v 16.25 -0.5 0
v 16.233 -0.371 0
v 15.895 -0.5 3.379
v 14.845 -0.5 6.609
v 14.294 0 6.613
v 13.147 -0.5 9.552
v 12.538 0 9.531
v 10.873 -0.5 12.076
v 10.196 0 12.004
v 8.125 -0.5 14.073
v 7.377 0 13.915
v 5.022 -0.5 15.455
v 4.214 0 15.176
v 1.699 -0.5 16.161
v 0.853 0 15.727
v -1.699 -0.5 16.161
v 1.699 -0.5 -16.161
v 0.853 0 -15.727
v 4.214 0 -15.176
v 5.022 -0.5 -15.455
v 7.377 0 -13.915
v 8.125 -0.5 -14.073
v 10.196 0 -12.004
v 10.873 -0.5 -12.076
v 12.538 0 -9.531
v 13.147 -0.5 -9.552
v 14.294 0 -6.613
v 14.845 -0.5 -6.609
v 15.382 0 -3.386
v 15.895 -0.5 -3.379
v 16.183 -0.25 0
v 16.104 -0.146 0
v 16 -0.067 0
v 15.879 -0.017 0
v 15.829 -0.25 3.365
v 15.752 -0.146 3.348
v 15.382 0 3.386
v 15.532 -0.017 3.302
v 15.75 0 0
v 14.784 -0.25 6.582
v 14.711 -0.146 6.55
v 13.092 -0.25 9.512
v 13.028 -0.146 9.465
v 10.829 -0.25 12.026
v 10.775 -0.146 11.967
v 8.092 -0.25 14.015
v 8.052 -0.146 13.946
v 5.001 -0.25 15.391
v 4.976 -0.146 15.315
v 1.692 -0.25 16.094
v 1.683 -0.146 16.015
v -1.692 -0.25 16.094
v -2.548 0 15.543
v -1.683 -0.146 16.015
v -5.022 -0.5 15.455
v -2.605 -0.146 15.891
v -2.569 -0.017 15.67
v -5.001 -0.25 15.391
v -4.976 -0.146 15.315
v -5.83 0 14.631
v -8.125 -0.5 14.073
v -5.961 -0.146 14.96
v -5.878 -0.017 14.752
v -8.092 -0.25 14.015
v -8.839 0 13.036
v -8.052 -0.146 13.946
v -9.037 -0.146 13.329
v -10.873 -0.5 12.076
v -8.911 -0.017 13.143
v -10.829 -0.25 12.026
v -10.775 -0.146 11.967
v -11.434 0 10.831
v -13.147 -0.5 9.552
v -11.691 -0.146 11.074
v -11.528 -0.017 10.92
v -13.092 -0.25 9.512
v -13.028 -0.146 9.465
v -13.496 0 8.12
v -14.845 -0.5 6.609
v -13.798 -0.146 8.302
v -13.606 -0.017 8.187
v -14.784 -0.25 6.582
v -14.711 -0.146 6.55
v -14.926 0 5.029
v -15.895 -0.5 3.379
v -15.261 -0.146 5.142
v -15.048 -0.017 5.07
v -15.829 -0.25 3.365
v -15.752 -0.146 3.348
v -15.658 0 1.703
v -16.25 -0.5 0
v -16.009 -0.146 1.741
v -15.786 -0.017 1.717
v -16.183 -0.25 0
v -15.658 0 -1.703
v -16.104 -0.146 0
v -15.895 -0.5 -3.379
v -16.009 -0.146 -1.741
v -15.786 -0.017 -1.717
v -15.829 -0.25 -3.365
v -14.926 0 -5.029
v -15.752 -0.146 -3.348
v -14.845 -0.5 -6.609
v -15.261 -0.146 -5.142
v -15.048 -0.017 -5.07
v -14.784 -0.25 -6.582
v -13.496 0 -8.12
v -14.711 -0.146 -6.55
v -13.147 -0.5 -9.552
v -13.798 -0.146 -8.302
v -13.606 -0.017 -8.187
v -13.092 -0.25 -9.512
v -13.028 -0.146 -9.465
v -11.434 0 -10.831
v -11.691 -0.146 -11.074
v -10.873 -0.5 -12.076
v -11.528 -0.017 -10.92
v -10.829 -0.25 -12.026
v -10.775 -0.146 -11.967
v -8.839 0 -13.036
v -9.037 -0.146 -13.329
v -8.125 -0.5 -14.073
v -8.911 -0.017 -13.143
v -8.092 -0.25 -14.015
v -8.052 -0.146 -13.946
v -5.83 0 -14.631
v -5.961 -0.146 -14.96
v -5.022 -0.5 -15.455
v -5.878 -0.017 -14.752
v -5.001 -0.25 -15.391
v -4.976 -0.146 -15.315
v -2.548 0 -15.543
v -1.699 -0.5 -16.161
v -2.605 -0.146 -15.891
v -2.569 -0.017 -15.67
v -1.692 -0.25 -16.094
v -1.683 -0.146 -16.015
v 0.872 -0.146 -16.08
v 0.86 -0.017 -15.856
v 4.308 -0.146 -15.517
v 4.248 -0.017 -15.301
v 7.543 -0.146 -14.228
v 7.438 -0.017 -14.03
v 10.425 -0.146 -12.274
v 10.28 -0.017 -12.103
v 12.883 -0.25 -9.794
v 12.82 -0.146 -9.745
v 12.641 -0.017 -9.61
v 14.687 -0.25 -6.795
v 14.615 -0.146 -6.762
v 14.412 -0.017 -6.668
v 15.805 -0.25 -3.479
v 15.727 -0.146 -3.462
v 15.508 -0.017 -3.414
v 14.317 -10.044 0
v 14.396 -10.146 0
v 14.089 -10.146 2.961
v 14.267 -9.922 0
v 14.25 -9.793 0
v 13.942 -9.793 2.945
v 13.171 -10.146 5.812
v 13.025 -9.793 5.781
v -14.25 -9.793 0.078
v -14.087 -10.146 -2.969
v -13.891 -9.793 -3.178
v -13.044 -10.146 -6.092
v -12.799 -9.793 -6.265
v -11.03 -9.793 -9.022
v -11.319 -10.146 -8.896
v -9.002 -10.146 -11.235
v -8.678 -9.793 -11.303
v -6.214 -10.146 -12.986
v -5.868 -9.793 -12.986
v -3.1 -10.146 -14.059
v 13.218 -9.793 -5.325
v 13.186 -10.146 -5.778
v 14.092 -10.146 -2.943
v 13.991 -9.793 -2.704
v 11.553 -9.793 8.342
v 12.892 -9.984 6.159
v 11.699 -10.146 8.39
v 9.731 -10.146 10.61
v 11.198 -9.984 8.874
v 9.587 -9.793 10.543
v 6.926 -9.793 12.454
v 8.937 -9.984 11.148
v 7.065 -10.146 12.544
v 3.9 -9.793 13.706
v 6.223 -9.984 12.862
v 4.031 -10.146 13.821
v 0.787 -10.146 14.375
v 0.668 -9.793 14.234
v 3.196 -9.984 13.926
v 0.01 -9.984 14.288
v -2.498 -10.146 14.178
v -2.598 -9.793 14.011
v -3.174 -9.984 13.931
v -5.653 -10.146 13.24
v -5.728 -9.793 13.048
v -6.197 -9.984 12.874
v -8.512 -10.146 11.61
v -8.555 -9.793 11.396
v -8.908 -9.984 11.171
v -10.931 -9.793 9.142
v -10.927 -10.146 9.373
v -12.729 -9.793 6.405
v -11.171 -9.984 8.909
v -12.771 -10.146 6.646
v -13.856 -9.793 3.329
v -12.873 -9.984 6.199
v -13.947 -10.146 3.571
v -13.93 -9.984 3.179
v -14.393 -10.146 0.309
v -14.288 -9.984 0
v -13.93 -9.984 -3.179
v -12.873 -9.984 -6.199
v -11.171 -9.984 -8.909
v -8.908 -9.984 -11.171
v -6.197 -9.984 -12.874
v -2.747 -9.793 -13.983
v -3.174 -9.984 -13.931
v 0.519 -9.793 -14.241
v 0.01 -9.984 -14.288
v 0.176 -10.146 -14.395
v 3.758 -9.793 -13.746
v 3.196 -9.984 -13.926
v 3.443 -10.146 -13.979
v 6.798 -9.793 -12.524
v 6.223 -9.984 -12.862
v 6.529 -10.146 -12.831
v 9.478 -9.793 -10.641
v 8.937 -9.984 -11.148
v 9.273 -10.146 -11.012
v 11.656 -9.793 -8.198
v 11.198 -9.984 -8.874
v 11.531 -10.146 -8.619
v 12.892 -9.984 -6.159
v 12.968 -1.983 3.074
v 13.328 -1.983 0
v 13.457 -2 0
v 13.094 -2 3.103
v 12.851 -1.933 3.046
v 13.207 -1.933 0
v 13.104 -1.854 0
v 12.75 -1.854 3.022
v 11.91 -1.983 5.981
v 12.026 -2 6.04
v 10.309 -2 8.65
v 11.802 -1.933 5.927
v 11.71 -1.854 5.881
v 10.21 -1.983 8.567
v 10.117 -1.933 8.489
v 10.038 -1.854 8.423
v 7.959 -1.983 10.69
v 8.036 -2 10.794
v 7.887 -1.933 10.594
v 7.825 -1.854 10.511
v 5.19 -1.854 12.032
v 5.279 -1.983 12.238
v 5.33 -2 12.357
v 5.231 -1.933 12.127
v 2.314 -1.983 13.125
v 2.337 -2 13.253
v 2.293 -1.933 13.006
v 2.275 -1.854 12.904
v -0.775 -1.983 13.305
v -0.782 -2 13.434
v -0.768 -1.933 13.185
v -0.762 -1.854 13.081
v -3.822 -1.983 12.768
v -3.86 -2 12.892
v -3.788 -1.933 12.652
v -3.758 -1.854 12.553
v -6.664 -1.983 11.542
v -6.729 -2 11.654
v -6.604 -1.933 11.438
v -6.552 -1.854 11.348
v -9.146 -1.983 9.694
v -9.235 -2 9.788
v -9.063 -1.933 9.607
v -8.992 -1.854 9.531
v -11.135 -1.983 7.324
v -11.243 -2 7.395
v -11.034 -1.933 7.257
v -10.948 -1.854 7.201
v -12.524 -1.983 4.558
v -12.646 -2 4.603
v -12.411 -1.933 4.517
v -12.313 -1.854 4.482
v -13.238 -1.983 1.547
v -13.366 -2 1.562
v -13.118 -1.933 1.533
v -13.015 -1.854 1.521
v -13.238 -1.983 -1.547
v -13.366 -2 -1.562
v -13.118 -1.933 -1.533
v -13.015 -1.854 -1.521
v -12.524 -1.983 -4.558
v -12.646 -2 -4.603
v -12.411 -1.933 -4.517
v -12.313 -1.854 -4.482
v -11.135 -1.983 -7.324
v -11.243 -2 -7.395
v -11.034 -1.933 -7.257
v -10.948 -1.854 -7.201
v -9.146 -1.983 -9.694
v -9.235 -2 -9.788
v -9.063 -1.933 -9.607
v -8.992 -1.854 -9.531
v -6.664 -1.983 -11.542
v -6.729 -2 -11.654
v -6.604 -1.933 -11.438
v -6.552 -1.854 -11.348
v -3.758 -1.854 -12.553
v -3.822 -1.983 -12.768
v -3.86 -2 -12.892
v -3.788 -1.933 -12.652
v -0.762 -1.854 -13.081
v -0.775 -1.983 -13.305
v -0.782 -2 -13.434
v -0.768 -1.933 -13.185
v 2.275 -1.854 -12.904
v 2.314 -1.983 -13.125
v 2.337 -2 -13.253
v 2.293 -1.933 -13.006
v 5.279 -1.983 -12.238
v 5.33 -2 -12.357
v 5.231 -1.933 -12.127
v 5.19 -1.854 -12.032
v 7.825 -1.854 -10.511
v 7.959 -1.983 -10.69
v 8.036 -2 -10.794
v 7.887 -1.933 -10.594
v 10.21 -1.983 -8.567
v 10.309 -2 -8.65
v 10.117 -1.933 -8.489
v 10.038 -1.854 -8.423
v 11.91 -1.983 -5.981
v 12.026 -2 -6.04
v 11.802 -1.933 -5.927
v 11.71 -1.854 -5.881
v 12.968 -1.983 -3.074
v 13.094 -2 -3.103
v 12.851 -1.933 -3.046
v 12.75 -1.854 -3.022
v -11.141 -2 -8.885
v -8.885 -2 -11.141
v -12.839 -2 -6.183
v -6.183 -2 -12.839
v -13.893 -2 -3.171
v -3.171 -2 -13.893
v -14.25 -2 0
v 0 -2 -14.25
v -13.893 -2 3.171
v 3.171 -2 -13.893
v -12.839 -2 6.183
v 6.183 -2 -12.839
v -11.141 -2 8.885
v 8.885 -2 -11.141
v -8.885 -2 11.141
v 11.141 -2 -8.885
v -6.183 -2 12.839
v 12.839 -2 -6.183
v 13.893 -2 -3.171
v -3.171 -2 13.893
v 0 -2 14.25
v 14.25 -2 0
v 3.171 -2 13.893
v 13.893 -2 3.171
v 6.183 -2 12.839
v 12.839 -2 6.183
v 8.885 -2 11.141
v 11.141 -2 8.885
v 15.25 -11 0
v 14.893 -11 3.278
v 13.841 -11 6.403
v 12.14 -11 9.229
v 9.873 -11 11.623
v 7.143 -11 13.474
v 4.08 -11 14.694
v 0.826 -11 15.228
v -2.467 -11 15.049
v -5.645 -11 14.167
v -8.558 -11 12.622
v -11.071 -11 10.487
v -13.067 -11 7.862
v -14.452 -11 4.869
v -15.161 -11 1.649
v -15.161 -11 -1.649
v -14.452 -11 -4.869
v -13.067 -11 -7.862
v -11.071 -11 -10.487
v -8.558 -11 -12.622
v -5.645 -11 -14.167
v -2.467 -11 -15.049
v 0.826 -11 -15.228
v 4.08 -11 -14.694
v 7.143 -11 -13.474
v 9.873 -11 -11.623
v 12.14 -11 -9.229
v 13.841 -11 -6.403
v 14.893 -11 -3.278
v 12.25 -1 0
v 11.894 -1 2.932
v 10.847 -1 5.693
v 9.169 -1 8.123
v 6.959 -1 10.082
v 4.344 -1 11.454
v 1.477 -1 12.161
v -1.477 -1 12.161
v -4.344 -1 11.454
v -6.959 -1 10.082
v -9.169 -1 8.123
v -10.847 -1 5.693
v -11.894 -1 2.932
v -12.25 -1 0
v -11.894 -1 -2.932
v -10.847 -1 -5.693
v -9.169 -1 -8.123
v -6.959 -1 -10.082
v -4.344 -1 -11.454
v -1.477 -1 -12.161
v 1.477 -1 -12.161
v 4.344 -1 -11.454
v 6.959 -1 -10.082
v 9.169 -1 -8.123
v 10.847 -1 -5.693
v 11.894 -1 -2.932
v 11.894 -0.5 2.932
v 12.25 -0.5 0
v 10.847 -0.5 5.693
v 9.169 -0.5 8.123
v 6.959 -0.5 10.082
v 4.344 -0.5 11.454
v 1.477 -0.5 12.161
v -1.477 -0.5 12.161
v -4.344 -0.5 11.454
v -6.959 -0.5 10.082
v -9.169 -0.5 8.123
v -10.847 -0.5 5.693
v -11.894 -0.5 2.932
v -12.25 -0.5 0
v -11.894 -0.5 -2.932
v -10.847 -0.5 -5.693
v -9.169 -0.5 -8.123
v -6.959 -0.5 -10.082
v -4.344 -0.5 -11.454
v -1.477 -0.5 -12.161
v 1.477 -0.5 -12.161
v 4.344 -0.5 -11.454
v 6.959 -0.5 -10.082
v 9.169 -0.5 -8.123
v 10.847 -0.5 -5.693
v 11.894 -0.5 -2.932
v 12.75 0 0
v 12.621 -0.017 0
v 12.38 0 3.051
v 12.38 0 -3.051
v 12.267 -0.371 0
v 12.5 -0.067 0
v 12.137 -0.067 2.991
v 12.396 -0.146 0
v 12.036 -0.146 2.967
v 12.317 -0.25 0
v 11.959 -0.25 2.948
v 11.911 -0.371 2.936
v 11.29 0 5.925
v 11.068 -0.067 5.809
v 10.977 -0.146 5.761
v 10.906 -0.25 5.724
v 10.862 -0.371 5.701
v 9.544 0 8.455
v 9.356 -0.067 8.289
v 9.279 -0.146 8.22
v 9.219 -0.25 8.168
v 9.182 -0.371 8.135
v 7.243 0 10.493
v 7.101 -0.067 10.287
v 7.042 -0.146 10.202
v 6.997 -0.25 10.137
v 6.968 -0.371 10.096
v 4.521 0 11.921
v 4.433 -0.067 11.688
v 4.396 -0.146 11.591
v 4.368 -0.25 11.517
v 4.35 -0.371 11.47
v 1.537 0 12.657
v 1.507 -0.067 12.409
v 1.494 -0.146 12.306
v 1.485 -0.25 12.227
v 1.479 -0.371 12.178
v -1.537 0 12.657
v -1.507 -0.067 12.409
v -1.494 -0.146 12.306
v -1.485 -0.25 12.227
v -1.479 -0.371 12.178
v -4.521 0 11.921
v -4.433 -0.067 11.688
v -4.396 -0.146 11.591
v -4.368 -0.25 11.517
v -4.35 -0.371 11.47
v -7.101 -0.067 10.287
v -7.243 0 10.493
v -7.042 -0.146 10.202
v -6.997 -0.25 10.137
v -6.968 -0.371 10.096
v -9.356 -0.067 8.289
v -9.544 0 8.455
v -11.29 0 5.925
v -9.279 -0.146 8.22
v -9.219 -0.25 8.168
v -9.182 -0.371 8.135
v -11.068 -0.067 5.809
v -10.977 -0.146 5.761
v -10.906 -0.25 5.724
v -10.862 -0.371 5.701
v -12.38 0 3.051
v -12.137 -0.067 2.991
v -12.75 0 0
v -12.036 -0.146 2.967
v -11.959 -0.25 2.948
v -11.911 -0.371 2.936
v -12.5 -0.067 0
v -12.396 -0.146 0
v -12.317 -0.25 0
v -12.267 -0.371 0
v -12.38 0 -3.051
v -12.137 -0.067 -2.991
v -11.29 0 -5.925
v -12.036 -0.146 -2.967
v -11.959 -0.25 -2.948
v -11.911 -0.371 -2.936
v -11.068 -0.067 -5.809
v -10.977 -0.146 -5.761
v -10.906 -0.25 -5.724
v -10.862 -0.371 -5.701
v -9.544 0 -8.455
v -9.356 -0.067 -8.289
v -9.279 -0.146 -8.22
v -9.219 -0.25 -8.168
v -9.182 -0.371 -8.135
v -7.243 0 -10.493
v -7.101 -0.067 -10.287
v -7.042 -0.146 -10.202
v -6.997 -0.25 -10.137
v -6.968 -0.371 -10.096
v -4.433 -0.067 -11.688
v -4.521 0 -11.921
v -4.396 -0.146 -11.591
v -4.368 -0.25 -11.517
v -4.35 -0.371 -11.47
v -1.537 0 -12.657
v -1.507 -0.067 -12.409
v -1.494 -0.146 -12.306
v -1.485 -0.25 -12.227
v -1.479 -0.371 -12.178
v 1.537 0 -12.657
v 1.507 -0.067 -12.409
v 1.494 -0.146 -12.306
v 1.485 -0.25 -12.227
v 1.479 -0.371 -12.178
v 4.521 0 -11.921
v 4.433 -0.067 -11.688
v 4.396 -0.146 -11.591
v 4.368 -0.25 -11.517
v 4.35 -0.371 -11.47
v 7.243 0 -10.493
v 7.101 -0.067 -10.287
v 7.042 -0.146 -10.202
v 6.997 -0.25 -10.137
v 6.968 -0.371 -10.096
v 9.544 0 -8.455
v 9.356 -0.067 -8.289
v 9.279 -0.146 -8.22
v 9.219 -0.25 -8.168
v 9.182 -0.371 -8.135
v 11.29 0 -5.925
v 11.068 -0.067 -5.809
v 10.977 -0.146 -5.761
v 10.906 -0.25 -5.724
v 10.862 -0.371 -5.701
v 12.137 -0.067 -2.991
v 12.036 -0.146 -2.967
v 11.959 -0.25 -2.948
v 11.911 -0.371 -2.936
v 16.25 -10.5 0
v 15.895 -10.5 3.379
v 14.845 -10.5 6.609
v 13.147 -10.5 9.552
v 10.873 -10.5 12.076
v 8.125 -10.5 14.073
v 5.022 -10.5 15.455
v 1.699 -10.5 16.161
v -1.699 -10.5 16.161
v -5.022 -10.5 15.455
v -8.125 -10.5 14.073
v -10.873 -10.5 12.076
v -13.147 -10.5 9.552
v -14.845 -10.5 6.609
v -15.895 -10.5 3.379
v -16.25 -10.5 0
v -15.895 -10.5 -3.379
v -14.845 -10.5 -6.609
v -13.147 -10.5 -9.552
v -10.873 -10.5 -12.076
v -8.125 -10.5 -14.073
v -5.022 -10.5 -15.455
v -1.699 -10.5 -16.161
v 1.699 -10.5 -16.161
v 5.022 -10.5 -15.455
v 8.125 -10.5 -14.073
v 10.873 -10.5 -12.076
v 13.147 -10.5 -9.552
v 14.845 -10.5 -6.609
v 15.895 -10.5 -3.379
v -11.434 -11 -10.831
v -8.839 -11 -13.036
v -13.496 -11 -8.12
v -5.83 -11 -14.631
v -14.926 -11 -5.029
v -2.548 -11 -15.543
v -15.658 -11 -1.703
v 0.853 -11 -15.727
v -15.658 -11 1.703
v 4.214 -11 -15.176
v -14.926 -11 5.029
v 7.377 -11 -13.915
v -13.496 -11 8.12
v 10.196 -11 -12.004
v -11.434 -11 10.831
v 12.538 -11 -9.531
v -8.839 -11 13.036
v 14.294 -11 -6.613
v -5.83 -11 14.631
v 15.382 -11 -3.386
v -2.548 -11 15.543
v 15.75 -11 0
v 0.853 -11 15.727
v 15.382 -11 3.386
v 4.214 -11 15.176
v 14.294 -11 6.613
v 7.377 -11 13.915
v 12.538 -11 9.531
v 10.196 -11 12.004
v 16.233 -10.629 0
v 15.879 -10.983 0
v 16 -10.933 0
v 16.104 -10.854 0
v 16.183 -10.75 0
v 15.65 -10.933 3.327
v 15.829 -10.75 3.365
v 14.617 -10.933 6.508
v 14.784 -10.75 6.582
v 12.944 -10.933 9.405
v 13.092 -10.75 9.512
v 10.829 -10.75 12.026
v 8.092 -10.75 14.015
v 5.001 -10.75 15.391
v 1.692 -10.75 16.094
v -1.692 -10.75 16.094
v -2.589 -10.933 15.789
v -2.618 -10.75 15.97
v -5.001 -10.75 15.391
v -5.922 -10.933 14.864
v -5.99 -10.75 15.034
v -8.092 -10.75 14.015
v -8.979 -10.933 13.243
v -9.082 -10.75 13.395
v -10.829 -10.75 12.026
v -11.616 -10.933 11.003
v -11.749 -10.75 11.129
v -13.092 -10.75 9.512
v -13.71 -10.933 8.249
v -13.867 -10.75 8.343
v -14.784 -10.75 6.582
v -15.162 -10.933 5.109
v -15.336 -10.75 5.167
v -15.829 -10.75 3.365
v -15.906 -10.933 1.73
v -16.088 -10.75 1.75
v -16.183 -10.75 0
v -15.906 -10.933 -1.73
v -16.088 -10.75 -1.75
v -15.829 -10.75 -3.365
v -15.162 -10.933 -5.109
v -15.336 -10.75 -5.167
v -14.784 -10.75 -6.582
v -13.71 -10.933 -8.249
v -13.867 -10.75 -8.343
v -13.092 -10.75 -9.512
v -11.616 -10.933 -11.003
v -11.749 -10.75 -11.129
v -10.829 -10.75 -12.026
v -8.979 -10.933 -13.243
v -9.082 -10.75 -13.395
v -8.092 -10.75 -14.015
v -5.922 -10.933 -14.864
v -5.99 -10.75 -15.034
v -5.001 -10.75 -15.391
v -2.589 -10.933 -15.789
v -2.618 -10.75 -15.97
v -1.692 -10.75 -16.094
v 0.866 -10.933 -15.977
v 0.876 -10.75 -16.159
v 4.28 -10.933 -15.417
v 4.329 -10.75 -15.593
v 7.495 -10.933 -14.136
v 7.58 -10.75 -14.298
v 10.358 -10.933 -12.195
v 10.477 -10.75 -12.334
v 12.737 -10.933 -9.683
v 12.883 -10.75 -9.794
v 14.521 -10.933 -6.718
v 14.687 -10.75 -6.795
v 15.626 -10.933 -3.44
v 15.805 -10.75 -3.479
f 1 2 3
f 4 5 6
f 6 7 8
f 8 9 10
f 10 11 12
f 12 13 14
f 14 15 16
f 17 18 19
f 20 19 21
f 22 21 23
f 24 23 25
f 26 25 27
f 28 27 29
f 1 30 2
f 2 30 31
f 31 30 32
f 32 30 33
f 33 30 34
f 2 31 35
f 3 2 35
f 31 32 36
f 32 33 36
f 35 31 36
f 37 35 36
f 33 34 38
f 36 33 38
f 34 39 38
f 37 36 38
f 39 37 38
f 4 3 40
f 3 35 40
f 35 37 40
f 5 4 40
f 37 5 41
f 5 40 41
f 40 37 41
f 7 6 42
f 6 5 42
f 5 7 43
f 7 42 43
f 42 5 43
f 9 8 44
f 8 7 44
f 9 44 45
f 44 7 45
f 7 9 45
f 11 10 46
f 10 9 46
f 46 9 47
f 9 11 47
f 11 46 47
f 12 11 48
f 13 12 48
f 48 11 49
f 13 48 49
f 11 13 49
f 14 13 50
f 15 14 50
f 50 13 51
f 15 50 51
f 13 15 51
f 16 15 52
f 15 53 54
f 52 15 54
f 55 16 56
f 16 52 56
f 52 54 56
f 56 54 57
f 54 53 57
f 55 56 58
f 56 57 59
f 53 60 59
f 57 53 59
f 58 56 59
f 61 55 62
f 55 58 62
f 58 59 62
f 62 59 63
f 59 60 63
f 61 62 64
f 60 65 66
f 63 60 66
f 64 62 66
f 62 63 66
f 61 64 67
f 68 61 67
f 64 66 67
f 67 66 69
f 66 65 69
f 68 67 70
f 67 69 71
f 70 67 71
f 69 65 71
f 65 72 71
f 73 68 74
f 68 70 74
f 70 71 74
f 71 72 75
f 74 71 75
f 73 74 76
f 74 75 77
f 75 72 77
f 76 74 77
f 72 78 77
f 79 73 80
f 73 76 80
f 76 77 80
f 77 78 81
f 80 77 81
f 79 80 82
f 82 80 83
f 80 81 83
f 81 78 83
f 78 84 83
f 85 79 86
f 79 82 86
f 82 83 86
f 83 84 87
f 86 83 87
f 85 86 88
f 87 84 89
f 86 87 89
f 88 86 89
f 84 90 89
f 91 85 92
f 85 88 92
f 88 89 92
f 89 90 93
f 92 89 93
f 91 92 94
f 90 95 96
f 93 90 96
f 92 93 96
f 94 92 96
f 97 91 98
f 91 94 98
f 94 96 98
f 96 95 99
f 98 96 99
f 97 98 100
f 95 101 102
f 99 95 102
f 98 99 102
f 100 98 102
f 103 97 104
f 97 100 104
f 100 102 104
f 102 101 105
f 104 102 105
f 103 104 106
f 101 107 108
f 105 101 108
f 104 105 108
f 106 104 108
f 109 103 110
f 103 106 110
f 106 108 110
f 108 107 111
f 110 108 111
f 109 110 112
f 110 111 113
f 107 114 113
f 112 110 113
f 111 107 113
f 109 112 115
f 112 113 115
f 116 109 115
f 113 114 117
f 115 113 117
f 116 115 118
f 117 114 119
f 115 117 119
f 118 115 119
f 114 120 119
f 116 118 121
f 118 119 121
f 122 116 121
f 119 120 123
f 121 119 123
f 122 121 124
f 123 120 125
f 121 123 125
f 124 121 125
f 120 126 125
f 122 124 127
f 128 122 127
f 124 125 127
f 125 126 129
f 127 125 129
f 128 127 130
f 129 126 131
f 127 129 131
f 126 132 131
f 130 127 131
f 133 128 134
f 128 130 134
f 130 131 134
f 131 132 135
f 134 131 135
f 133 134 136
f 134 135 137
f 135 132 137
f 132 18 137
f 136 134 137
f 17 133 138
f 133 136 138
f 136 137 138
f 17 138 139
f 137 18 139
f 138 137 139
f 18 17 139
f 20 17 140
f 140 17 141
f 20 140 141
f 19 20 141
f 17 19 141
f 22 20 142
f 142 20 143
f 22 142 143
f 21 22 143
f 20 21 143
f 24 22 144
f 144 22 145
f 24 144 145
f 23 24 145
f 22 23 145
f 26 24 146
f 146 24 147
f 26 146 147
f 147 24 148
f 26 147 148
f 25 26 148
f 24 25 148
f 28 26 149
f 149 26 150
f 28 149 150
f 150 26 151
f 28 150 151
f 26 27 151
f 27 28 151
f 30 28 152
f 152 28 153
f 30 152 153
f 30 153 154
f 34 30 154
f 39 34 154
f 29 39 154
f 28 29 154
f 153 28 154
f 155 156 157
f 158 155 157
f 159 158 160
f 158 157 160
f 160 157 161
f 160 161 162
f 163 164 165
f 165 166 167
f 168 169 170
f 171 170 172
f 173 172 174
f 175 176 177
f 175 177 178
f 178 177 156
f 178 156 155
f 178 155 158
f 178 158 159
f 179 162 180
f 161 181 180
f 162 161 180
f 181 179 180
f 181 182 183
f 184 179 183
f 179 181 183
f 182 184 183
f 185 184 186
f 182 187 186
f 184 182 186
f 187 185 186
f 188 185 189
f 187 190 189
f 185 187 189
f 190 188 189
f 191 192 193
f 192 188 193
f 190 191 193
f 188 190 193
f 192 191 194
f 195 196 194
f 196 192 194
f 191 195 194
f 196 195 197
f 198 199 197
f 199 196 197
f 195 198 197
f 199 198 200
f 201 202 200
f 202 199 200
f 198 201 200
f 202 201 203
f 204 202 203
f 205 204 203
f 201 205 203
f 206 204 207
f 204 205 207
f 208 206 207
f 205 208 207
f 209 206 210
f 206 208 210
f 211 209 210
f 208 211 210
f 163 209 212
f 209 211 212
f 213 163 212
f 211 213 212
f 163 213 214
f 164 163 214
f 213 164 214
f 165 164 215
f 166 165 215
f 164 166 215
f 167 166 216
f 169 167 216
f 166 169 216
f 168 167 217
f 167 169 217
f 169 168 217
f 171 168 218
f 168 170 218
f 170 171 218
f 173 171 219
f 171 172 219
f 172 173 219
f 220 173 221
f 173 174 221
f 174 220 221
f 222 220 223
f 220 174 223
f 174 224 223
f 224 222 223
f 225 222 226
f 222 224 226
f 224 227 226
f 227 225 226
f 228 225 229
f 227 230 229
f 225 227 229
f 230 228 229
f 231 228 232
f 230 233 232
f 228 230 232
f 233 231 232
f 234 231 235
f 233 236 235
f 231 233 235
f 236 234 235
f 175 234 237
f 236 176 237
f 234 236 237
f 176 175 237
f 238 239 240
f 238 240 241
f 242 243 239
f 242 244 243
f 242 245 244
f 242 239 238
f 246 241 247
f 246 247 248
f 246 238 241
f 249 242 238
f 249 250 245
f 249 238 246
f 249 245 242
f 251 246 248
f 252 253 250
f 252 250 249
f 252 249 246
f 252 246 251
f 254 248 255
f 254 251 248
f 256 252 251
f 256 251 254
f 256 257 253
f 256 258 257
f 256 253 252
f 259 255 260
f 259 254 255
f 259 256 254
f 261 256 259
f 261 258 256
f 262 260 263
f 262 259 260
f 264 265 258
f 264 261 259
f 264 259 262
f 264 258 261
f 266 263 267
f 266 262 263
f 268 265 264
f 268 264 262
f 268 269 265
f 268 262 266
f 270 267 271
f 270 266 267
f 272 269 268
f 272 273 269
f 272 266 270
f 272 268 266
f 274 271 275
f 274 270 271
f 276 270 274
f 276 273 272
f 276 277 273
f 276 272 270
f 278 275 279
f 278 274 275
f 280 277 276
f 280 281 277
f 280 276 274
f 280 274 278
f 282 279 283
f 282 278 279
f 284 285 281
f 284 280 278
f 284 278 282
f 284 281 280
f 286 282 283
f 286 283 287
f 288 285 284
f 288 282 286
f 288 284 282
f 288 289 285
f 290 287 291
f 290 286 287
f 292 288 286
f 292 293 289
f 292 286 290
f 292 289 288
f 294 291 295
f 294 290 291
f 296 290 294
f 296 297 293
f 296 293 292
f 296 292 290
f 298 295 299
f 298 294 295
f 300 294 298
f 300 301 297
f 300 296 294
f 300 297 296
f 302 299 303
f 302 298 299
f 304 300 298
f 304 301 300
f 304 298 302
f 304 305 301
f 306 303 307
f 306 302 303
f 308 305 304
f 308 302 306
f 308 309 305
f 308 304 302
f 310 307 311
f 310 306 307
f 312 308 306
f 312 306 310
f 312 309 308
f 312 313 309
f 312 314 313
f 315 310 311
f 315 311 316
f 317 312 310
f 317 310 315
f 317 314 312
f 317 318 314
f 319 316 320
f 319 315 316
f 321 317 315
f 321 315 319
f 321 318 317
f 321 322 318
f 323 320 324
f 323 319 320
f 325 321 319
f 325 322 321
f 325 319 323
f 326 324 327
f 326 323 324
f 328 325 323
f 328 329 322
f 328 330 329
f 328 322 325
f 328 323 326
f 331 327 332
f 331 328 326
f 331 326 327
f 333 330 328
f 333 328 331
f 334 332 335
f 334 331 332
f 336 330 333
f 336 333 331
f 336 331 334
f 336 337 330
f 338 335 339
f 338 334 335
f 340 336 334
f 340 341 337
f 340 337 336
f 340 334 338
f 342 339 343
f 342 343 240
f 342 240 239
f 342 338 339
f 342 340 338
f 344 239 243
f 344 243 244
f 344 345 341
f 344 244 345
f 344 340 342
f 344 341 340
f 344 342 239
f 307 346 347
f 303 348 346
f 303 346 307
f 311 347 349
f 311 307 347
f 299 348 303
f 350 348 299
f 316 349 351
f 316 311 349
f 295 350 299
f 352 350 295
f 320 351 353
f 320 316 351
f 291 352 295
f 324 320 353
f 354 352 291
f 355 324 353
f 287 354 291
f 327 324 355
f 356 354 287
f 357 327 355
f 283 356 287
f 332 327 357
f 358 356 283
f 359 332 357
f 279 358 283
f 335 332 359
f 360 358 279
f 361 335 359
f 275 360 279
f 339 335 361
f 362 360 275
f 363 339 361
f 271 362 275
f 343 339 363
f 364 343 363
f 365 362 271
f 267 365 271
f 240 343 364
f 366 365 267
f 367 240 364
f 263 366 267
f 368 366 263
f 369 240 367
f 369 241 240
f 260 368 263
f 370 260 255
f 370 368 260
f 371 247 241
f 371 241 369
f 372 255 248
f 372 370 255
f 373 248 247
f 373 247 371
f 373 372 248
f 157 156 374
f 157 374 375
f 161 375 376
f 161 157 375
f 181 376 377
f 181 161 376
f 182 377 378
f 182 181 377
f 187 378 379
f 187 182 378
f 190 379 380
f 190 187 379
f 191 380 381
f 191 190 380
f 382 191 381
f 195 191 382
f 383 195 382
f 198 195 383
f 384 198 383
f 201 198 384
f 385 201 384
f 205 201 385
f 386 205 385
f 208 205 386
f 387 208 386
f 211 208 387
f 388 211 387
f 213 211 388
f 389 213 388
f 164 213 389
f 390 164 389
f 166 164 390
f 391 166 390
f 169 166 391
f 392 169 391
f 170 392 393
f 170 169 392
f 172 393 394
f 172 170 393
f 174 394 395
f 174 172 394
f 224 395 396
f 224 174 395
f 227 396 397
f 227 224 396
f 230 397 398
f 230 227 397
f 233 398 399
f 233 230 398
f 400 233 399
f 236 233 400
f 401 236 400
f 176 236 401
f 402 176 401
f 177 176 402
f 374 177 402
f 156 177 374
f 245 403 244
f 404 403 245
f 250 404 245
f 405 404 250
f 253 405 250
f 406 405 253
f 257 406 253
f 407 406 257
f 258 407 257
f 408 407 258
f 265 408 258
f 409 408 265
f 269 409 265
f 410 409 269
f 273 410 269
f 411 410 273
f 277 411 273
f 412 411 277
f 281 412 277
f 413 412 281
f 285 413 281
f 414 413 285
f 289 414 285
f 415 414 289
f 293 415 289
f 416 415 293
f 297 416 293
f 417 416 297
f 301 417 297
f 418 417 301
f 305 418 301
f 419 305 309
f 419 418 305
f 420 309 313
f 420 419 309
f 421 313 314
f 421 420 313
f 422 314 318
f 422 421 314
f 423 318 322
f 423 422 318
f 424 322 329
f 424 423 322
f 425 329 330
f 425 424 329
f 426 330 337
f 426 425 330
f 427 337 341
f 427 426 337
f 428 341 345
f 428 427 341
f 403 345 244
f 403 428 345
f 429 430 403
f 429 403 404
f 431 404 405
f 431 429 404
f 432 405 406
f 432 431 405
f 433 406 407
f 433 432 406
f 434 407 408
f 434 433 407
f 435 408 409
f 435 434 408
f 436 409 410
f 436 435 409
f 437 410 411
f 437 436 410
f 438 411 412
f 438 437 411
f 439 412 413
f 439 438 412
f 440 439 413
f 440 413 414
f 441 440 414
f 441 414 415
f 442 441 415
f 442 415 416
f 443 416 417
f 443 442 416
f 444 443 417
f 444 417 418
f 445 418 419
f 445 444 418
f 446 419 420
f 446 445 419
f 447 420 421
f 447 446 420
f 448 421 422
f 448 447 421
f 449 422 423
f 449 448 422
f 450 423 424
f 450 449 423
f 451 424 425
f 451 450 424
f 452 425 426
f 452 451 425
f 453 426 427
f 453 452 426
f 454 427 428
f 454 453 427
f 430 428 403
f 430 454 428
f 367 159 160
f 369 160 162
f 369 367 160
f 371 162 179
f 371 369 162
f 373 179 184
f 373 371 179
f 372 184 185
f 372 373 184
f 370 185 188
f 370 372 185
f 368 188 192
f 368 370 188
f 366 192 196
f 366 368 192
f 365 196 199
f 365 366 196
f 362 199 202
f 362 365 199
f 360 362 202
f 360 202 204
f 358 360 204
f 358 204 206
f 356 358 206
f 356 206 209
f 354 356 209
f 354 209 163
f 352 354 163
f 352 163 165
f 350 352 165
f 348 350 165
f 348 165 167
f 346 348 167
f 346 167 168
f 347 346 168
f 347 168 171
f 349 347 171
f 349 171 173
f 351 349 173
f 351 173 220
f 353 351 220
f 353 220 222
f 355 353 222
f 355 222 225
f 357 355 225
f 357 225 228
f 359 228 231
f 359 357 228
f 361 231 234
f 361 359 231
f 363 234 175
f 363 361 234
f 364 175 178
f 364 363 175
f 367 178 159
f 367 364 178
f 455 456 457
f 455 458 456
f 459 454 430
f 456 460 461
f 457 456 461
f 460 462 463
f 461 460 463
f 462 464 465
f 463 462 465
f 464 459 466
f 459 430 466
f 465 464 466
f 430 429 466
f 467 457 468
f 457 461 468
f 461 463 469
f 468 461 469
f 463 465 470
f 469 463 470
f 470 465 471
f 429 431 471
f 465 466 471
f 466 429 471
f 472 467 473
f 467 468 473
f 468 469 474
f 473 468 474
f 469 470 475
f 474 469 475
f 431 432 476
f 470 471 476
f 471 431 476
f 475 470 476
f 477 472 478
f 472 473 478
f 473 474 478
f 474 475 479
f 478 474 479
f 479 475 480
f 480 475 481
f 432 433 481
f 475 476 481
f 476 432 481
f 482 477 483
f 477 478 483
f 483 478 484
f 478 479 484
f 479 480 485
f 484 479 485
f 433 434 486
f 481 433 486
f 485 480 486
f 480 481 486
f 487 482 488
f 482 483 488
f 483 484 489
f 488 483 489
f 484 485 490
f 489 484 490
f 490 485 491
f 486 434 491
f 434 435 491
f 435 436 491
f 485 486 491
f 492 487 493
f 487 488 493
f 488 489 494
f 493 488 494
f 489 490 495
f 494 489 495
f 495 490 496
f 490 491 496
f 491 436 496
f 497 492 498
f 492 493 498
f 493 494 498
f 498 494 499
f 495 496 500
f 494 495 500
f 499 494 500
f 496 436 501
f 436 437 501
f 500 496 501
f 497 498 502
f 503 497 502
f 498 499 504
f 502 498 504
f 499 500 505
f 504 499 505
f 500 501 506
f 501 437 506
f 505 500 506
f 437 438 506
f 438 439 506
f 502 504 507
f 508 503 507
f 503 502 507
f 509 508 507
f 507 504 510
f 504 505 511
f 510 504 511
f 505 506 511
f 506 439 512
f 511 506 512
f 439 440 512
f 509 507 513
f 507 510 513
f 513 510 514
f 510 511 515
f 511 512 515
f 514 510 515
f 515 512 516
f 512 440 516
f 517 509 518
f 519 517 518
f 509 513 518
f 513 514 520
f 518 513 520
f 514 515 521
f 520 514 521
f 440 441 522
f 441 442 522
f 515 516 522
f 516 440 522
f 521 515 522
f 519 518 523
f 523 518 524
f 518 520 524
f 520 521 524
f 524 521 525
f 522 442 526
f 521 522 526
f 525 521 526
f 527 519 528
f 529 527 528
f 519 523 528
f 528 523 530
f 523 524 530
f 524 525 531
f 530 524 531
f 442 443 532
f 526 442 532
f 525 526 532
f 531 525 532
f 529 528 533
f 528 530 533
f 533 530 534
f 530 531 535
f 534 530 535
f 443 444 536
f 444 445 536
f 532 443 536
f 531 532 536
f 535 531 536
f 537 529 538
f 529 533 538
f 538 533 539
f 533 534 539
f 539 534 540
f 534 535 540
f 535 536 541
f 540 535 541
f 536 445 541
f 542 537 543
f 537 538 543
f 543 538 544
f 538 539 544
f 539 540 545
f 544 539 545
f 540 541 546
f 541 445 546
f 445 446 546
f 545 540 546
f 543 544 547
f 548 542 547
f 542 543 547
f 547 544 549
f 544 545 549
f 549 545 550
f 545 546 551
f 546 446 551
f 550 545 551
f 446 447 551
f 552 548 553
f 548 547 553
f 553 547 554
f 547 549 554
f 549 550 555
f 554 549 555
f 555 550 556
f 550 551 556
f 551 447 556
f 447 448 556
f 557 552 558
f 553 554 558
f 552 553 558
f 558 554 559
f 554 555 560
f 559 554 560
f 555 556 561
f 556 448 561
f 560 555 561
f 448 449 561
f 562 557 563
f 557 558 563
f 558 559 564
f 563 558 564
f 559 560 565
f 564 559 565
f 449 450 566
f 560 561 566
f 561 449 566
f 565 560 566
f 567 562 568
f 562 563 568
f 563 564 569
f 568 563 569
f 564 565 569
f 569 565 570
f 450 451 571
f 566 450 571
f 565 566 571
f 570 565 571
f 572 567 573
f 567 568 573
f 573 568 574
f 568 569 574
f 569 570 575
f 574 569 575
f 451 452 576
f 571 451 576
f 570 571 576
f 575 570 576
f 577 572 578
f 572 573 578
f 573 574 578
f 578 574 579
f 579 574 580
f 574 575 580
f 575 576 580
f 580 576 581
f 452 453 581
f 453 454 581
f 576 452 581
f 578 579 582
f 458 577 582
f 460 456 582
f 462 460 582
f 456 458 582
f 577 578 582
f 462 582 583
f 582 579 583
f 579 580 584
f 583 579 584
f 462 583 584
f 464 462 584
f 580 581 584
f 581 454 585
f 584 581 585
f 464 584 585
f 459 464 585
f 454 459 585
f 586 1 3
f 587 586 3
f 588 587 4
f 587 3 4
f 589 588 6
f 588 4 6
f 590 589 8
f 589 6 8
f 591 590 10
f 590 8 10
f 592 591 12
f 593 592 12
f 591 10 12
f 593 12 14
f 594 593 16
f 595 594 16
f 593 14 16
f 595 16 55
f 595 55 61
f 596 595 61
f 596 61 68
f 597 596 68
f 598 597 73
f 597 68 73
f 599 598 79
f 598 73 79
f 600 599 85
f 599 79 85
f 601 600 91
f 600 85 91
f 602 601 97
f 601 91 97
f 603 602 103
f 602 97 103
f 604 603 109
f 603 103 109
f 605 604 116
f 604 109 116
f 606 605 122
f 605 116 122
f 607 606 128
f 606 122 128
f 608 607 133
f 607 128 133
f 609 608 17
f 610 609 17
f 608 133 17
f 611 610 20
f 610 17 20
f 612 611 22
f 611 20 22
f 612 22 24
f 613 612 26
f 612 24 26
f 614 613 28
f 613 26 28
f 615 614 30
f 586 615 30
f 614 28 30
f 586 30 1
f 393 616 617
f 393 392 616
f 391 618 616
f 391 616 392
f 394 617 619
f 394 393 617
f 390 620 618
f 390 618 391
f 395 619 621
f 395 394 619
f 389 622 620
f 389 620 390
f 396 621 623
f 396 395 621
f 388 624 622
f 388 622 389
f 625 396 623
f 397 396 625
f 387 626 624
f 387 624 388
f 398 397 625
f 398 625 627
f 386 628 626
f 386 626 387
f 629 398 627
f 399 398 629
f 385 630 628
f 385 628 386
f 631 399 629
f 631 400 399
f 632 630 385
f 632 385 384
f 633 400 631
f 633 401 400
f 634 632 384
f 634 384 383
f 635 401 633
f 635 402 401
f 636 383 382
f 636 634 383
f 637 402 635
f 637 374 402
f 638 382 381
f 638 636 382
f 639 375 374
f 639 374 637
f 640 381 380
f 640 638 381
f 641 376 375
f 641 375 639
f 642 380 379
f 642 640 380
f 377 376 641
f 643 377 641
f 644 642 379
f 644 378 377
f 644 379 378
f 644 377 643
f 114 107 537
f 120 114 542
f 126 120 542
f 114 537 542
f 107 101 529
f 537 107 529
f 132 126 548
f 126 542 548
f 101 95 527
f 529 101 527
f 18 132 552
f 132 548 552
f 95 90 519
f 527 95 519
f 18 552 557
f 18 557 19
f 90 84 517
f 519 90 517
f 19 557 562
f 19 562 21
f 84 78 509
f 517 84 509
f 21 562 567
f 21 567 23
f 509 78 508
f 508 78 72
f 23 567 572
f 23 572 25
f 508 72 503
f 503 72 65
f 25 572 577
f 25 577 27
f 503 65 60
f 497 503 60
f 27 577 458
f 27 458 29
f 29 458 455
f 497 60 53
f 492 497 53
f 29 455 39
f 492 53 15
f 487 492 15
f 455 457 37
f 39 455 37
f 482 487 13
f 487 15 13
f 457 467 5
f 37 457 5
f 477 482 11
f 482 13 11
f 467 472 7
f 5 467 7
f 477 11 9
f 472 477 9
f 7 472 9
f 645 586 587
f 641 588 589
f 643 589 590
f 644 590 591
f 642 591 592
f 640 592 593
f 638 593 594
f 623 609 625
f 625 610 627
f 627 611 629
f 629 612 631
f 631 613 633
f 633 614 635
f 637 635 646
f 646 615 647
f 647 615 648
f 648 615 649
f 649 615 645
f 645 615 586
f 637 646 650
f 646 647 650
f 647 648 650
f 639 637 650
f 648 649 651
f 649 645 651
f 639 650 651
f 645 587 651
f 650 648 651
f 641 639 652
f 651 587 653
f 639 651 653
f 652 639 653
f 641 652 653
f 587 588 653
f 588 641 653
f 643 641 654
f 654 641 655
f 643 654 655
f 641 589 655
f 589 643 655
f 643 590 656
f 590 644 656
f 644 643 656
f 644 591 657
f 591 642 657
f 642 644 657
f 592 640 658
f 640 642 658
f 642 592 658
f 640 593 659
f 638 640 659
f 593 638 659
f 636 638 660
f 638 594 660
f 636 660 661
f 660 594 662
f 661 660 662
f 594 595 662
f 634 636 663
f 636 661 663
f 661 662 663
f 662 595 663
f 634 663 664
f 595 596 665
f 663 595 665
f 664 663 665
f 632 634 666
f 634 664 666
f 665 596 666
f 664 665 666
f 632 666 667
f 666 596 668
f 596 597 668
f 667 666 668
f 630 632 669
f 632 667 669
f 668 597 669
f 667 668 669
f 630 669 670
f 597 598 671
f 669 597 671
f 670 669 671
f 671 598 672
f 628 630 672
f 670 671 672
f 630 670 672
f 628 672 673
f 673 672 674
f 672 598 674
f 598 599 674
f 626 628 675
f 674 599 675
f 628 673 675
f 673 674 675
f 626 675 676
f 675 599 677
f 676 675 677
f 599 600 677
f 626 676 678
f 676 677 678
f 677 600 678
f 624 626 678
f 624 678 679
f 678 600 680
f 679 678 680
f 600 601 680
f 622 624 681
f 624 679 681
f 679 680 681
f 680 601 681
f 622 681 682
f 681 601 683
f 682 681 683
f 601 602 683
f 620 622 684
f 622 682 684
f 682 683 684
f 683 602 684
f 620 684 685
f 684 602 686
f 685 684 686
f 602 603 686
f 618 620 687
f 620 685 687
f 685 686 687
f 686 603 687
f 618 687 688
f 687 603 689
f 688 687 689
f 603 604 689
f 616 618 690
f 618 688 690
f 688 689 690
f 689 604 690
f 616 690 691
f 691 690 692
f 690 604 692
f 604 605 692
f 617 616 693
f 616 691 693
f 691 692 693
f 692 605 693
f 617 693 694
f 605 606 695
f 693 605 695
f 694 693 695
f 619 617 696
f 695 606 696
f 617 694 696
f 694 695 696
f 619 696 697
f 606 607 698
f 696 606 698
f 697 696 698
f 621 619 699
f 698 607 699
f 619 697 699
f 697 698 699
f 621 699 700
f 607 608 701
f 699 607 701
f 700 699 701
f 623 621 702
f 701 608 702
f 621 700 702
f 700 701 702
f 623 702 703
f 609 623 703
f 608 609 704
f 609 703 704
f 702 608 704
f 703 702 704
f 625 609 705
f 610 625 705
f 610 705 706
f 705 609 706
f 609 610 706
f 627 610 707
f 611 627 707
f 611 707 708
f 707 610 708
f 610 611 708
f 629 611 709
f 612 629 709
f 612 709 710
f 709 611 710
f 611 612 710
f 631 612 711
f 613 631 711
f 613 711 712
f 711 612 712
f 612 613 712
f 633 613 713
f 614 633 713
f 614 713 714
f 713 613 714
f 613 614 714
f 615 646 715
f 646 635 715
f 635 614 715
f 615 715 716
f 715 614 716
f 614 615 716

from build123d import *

# Parameters (mm, degrees)
F0_R     = 16.25
F0_R_2   = 14.25
F0_R_3   = 12.25
F1_DEPTH = 2
F2_DEPTH = 11
F3_SIZE  = 1
F4_R     = 0.5


with BuildPart() as f1:
    # F0 (on Front) → F1 (new body)
    with BuildSketch(Plane.XZ):
        Circle(F0_R)
        Circle(F0_R_2, mode=Mode.SUBTRACT)
        Circle(F0_R_2)
        Circle(F0_R_3, mode=Mode.SUBTRACT)
    extrude(amount=F1_DEPTH)

    # F0 (on Front) → F2 (join)
    with BuildSketch(Plane.XZ):
        Circle(F0_R)
        Circle(F0_R_2, mode=Mode.SUBTRACT)
    extrude(amount=F2_DEPTH)

    # F3
    f3_edges = [f1.edges().sort_by_distance(p)[0] for p in [
        (-14.25, -11, 0),
        (-12.25, -2, 0),
    ]]
    chamfer(f3_edges, length=F3_SIZE)

    # F4
    f4_edges = [f1.edges().sort_by_distance(p)[0] for p in [
        (-16.25, 0, 0),
        (16.25, -5.5, 0),
        (-16.25, -11, 0),
        (-12.25, 0, 0),
        (-14.25, -10, 0),
        (-13.25, -2, 0),
    ]]
    fillet(f4_edges, radius=F4_R)


solid = f1.part
